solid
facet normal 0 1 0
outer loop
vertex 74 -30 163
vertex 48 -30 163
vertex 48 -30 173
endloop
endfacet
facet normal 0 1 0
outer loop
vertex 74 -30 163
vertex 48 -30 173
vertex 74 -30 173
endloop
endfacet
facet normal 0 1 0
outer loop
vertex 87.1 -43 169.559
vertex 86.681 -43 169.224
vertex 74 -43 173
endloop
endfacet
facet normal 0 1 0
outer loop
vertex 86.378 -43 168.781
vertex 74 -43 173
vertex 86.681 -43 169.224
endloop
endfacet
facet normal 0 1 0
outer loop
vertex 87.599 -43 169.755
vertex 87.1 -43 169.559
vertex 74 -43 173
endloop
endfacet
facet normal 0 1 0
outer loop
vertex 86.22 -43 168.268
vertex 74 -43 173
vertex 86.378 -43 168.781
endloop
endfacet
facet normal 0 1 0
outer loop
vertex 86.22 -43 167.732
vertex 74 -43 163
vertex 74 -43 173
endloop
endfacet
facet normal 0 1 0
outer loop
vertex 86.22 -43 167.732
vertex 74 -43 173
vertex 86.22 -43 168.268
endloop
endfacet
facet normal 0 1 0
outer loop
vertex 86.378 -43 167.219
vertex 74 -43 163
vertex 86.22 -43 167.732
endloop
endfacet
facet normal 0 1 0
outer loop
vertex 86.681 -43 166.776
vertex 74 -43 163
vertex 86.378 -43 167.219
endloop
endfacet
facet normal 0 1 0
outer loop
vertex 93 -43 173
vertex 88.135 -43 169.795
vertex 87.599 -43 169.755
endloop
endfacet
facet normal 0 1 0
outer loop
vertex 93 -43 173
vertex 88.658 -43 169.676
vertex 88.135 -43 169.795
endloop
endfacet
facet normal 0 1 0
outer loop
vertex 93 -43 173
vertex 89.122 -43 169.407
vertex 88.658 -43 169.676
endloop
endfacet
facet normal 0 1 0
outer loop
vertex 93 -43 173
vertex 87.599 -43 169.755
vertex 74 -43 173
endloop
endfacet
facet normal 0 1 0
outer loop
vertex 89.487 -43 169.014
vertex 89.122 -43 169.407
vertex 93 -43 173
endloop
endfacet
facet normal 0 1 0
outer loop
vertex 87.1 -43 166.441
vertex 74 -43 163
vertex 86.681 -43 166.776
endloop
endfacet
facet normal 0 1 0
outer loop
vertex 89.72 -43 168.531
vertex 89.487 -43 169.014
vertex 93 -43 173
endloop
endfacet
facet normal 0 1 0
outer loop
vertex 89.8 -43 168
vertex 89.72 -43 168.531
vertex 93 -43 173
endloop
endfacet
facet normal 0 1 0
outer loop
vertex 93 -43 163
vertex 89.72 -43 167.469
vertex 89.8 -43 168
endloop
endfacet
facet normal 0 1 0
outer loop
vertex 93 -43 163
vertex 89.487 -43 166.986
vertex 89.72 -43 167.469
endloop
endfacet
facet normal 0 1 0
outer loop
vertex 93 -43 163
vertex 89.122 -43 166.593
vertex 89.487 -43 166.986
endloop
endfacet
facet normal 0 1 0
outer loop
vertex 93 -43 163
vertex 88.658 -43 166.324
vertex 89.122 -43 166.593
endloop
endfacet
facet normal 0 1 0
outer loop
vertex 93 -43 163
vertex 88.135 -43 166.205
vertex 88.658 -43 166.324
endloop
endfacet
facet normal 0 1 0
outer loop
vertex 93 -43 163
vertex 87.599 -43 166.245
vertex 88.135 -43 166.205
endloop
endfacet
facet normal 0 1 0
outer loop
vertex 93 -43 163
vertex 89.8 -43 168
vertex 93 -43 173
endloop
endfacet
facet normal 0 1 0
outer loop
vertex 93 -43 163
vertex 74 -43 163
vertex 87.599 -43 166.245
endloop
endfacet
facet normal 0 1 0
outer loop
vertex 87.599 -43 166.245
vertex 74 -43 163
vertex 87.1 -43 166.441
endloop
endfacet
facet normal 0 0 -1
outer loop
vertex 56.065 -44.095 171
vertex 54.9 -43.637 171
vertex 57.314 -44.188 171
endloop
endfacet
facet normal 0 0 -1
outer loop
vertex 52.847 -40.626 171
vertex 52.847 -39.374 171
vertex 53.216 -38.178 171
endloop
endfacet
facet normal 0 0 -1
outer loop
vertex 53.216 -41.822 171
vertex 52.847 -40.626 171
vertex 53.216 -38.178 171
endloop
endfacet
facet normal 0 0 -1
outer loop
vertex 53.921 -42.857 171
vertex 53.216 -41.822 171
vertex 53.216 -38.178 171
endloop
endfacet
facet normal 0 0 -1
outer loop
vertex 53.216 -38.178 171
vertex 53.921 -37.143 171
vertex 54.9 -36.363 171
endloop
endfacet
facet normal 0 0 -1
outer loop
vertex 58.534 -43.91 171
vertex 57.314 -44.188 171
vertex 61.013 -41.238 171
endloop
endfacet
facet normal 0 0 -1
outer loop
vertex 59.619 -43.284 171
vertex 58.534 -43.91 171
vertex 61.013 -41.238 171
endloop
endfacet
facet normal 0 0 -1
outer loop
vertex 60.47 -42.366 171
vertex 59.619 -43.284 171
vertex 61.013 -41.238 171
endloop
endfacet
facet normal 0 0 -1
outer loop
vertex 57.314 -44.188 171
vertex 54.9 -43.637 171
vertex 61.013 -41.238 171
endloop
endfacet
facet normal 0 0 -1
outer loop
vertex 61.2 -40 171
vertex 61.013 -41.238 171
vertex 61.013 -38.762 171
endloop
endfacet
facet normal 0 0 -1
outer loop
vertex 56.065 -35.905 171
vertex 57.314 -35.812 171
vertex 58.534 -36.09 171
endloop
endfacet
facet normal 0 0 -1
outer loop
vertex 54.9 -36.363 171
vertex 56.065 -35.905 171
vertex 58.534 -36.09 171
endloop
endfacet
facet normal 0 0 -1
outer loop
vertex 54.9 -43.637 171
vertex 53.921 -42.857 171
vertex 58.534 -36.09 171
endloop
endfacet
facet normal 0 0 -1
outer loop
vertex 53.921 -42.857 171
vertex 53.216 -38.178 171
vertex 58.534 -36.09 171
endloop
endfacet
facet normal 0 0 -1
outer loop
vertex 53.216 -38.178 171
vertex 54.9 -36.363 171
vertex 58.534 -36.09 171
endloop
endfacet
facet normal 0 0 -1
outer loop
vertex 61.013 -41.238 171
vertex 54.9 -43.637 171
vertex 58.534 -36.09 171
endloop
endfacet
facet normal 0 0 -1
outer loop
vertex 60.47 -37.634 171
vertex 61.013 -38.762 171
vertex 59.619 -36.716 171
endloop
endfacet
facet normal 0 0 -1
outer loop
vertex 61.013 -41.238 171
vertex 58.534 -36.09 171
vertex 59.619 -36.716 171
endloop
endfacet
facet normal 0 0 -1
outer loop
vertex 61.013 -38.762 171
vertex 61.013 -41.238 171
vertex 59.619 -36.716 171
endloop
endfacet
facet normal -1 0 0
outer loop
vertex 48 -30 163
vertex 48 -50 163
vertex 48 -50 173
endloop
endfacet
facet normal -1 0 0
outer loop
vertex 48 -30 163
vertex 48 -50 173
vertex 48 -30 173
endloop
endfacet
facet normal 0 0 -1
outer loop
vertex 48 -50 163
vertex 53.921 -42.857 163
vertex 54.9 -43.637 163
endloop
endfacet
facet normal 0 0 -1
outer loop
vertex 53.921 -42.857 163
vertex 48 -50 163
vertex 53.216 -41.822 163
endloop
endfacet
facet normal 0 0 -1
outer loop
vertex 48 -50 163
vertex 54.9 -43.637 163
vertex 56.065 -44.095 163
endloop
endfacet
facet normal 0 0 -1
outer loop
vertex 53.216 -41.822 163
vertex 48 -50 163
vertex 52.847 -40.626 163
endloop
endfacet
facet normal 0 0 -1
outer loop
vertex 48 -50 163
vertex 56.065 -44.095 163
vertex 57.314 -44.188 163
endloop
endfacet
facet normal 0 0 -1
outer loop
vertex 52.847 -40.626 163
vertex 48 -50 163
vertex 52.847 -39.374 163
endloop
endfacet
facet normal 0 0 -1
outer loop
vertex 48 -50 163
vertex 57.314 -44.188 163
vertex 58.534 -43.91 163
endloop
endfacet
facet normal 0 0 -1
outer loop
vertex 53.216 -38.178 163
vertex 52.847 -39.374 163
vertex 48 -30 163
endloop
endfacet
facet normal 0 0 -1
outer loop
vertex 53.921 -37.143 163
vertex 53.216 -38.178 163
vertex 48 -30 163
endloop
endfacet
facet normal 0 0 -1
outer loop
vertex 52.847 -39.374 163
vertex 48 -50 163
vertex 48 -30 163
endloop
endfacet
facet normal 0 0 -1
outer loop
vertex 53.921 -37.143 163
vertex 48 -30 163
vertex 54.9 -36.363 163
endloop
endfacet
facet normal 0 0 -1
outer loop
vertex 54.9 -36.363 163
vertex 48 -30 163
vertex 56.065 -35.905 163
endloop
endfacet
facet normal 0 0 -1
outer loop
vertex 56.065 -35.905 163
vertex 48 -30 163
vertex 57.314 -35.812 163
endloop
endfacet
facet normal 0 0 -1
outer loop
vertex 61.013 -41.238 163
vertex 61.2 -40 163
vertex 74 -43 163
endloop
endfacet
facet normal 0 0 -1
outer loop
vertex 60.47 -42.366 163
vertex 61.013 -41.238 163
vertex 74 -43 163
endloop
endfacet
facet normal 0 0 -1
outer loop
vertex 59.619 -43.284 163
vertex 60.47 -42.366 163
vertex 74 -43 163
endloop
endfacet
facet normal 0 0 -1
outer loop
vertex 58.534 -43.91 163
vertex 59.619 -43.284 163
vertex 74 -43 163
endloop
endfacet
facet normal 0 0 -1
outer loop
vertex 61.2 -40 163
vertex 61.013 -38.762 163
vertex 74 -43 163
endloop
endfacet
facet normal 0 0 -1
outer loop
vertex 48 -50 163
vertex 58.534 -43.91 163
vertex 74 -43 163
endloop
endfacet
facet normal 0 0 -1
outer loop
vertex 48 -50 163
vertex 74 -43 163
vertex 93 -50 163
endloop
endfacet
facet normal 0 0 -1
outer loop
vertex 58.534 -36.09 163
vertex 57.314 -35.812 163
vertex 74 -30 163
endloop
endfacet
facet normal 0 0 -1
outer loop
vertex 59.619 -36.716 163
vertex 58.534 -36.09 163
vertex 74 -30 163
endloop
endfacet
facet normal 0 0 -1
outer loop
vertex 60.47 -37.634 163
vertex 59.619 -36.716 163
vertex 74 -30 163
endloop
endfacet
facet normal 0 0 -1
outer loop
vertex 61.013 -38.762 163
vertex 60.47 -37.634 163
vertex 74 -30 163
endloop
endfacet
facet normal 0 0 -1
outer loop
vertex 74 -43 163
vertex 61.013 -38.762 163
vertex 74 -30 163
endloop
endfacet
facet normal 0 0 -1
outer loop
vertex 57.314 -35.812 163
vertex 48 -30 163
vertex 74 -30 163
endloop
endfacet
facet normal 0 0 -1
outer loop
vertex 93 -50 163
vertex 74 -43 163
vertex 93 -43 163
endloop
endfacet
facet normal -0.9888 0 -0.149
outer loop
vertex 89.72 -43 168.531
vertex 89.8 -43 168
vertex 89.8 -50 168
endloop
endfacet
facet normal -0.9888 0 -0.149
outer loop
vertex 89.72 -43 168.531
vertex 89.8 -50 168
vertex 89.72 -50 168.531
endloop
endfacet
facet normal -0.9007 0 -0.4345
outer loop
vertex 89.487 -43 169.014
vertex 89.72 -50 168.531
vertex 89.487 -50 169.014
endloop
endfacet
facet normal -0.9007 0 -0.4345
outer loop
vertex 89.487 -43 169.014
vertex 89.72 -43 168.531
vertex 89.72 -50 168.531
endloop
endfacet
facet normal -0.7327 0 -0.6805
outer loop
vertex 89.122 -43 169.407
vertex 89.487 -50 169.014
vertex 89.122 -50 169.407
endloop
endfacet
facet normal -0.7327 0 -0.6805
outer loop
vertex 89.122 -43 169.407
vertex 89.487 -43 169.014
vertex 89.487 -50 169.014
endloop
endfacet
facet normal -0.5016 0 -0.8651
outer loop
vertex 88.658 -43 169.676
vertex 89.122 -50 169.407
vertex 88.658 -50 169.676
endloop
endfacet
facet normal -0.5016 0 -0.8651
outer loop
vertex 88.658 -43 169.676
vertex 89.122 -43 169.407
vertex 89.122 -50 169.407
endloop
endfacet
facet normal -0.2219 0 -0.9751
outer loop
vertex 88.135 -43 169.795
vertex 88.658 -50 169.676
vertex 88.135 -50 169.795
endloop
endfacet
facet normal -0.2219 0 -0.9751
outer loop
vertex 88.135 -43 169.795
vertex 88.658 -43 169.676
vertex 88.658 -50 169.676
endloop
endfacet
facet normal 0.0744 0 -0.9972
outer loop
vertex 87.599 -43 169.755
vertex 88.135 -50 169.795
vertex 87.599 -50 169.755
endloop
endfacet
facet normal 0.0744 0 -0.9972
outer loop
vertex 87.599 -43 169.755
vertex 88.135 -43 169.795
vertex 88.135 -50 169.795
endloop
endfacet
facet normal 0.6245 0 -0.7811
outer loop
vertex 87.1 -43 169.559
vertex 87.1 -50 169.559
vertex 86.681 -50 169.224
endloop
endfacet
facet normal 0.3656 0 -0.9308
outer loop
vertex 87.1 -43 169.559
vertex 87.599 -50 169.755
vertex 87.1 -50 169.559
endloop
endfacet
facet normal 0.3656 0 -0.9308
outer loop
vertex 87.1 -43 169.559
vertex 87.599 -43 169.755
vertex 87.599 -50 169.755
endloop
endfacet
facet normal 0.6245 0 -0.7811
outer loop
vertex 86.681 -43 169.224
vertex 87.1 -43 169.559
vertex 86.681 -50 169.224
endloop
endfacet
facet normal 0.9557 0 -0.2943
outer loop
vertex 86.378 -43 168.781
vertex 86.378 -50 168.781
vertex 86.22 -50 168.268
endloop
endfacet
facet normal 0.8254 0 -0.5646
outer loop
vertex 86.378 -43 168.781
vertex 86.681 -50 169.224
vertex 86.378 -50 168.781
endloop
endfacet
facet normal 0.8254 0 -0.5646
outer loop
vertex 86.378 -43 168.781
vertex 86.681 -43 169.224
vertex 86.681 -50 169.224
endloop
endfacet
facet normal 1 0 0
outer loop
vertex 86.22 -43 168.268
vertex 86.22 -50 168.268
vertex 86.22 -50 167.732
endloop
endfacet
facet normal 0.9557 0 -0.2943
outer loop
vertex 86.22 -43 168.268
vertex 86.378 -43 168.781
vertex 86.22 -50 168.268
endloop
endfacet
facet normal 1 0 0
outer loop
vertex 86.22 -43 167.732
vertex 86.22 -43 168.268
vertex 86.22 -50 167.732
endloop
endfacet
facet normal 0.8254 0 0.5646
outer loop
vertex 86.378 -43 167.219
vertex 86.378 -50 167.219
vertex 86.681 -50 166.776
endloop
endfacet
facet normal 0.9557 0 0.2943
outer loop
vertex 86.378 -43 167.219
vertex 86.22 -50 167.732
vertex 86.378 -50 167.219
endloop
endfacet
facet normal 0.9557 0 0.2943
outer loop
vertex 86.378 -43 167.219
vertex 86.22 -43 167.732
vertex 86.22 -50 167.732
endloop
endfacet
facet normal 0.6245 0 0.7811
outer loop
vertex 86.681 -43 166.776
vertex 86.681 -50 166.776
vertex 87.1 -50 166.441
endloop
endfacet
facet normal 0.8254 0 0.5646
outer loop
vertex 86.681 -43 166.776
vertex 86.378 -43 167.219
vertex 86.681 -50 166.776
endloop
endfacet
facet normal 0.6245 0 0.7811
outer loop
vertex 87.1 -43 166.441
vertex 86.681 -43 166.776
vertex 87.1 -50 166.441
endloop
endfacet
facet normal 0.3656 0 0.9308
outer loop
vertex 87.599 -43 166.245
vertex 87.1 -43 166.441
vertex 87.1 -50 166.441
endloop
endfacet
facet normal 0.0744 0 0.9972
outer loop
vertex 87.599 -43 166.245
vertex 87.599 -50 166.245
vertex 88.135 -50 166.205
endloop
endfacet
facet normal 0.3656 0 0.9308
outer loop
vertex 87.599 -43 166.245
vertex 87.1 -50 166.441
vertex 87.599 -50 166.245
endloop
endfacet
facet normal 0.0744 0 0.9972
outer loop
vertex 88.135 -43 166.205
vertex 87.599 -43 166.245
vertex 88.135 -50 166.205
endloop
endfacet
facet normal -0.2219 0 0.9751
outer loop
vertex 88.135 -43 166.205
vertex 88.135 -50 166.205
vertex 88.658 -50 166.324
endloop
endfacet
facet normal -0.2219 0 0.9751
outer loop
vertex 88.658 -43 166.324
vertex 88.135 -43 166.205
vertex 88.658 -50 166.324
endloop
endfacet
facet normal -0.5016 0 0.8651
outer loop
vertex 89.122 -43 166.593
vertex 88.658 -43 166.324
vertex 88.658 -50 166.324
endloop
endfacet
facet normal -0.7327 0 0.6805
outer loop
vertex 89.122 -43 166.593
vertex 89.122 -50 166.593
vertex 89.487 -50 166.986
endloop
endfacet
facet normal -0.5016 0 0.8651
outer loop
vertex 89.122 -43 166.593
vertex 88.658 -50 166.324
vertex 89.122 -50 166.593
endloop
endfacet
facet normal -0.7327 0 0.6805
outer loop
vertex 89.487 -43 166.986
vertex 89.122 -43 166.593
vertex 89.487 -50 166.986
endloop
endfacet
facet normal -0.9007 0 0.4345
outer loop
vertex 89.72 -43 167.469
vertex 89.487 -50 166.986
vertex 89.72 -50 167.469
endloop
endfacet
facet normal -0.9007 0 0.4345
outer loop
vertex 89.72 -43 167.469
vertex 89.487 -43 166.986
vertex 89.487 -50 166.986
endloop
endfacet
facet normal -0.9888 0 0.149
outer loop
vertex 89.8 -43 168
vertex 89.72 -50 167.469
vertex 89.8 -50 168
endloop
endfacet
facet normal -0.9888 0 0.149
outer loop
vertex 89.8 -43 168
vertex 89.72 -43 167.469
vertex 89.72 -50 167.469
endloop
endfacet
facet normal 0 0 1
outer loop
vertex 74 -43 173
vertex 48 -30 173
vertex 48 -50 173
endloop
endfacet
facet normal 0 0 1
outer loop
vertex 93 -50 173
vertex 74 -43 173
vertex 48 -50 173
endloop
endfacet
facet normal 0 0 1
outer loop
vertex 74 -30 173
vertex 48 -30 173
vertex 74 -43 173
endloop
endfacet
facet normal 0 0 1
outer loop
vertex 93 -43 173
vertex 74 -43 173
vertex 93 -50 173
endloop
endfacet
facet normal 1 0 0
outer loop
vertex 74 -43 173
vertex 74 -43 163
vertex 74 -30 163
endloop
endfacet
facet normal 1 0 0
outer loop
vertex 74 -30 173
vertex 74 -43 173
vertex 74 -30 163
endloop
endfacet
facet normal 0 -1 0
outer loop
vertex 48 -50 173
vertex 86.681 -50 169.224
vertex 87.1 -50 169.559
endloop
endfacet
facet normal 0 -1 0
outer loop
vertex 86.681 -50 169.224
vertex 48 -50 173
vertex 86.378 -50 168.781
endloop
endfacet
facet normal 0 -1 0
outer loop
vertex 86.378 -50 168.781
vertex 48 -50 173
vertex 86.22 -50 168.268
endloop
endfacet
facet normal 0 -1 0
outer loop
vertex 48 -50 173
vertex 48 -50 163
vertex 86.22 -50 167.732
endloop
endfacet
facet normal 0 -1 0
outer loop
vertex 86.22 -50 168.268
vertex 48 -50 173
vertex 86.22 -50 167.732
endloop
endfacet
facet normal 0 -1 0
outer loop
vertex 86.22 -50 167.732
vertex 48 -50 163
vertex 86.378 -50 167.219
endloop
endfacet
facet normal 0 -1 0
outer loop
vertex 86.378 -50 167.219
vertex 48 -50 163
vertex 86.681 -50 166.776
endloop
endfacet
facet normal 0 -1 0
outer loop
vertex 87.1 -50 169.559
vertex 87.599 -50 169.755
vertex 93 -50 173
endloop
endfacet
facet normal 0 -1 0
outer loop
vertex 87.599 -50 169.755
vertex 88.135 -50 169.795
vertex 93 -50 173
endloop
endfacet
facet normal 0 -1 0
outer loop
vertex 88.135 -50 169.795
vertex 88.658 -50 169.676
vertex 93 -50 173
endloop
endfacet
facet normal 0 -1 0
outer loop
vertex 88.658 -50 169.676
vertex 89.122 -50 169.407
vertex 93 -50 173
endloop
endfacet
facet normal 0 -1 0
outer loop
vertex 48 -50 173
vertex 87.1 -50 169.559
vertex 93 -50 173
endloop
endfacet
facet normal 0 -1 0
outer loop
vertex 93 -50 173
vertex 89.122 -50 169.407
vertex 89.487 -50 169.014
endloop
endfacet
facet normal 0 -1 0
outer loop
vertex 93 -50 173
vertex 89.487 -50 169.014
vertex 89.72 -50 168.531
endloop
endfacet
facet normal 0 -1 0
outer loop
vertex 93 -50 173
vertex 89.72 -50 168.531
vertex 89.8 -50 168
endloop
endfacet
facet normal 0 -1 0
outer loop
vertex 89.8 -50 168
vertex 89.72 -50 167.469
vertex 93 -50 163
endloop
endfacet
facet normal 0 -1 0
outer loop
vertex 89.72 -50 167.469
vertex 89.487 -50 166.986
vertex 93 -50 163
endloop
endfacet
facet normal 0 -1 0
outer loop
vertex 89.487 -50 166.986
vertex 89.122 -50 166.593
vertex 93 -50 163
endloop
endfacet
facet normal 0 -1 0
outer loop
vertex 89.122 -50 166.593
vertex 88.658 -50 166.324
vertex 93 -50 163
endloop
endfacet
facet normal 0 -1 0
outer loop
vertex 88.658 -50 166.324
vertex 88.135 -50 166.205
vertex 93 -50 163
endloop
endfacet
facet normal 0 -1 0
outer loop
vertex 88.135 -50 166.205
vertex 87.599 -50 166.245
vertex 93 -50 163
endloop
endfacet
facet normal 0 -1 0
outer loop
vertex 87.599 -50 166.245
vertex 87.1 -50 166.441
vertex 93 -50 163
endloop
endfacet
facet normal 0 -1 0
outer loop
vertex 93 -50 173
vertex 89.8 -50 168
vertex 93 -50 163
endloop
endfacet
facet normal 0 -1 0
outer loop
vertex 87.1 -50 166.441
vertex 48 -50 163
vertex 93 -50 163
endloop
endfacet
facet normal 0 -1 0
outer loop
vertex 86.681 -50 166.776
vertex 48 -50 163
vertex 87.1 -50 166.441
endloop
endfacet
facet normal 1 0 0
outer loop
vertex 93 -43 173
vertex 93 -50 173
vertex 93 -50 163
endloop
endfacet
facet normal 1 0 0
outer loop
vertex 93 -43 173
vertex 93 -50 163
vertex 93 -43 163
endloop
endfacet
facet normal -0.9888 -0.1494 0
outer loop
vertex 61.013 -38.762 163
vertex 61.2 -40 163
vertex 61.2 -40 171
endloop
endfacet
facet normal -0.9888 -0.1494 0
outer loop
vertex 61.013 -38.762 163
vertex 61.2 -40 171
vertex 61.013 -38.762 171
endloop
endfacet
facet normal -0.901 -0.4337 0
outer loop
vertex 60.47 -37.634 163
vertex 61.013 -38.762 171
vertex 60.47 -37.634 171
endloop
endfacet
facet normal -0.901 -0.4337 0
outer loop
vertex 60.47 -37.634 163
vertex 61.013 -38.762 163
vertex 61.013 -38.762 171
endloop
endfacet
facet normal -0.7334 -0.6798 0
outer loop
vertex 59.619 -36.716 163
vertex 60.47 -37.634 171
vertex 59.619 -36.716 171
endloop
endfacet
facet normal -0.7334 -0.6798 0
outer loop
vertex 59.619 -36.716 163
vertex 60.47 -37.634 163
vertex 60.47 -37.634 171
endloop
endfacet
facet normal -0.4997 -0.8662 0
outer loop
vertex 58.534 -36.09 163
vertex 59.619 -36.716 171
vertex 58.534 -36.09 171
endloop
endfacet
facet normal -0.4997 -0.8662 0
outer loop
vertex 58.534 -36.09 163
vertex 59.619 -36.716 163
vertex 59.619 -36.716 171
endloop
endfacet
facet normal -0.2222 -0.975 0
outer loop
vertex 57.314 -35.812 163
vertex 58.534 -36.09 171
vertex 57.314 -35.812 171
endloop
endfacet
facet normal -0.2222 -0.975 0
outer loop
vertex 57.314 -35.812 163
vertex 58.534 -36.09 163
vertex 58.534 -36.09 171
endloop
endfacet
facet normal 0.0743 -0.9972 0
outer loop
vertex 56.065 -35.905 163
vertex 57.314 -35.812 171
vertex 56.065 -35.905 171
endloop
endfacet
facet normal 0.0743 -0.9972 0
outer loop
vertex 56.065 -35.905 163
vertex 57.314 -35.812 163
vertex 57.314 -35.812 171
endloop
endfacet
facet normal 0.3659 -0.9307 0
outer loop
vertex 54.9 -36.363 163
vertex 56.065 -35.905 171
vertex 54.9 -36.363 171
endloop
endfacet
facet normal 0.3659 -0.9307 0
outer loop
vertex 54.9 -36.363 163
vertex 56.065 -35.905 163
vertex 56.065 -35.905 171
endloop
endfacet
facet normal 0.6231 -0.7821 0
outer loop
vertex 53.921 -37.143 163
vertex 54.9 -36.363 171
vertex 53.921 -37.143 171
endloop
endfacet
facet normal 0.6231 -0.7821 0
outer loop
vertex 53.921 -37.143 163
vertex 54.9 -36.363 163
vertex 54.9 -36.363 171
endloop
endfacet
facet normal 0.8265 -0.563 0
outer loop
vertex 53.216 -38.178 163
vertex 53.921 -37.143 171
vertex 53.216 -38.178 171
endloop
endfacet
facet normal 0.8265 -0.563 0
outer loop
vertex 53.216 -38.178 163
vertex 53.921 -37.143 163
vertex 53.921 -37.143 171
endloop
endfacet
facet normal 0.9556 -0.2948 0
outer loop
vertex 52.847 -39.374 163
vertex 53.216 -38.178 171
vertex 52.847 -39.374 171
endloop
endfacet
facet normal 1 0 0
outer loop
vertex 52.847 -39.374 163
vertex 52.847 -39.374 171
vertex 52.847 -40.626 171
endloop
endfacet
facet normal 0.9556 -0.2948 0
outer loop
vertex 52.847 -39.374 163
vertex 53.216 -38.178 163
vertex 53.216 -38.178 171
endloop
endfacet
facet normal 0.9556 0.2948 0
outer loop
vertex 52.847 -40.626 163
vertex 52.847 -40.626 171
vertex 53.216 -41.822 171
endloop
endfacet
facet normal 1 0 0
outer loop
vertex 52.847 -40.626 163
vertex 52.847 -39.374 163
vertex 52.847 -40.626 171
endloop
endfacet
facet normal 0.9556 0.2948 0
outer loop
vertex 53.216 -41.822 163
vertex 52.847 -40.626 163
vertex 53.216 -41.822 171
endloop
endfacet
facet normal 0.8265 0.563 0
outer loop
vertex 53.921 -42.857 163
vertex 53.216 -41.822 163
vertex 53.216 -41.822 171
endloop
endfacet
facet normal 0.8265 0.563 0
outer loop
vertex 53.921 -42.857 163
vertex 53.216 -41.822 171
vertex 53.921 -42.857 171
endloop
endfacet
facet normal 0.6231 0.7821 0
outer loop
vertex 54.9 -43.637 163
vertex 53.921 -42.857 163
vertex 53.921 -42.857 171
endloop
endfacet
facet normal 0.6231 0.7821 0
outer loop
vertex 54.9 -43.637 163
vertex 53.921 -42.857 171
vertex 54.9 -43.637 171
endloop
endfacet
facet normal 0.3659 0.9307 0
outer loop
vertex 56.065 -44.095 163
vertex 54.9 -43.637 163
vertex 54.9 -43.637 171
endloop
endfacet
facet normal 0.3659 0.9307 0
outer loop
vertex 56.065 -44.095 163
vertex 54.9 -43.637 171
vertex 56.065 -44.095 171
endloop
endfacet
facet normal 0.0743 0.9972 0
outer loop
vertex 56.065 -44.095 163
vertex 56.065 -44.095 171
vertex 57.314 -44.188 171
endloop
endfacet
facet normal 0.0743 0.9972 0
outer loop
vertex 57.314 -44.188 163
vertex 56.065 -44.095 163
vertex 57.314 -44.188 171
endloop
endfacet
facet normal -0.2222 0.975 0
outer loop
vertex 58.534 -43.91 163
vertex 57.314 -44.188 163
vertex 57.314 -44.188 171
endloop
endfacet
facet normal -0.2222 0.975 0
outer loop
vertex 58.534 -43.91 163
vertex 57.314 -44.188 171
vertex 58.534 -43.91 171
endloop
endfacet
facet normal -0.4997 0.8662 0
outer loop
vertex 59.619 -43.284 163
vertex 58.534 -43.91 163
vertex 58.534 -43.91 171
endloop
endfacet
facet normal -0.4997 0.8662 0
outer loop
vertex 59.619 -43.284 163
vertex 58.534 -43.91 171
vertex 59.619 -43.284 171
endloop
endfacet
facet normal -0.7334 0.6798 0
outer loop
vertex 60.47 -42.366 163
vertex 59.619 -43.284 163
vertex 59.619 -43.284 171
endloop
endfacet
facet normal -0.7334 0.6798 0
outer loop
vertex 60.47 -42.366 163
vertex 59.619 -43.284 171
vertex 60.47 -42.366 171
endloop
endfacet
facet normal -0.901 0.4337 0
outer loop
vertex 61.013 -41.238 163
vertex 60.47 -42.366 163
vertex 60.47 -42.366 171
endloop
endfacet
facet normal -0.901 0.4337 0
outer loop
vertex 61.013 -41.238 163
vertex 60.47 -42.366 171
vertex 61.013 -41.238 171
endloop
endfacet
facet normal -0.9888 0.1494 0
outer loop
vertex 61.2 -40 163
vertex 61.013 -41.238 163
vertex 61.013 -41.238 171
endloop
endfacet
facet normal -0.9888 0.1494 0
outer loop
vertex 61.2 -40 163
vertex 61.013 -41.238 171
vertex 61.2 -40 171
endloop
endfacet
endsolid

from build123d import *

# Parameters (mm, degrees)
CYLINDER040_R          = 4.2
CYLINDER040_DEPTH      = 200
CYLINDER037_R          = 1.8
CYLINDER037_DEPTH      = 21
CYLINDER037_ROLL_ANGLE = 90
BOX009_W               = 19
BOX009_H               = 14
BOX009_DEPTH           = 10
BOX008_W               = 45
BOX008_H               = 20
BOX008_DEPTH           = 10


with BuildPart() as cilindro037:
    # Cylinder040 → Cylinder040 (new body)
    with BuildSketch(Plane(origin=(57, -40, -29), x_dir=(1, 0, 0), z_dir=(0, 0, 1))):
        Circle(CYLINDER040_R)
    extrude(amount=CYLINDER040_DEPTH)


with BuildPart() as cilindro034:
    # Cylinder037 → Cylinder037 (new body)
    with BuildSketch(Plane.XY):
        Circle(CYLINDER037_R)
    extrude(amount=CYLINDER037_DEPTH)


with BuildPart() as cilindro034_1:
    # Cylinder037 roll: moved
    add(cilindro034.part.rotate(Axis((0, 0, 0), (1, 0, 0)), CYLINDER037_ROLL_ANGLE))


with BuildPart() as cilindro034_2:
    # Cylinder037 placement: moved
    add(cilindro034_1.part.moved(Location((88, -32, 22))))


with BuildPart() as cubo009:
    # Box009 → Box009 (new body)
    with BuildSketch(Plane(origin=(74, -43, 17), x_dir=(1, 0, 0), z_dir=(0, 0, 1))):
        with Locations((9.5, 7)):
            Rectangle(BOX009_W, BOX009_H)
    extrude(amount=BOX009_DEPTH)


with BuildPart() as parte_superior:
    # Box008 → Box008 (new body)
    with BuildSketch(Plane(origin=(48, -50, 17), x_dir=(1, 0, 0), z_dir=(0, 0, 1))):
        with Locations((22.5, 10)):
            Rectangle(BOX008_W, BOX008_H)
    extrude(amount=BOX008_DEPTH)

    # Cut037: cut Cubo009
    add(cubo009.part, mode=Mode.SUBTRACT)

    # Cut038: cut Cilindro034
    add(cilindro034_2.part, mode=Mode.SUBTRACT)


with BuildPart() as parte_superior_1:
    # Cut038 placement: moved
    add(parte_superior.part.moved(Location((0, 0, 146))))

    # Cut039: cut Cilindro037
    add(cilindro037.part, mode=Mode.SUBTRACT)


solid = parte_superior_1.part
